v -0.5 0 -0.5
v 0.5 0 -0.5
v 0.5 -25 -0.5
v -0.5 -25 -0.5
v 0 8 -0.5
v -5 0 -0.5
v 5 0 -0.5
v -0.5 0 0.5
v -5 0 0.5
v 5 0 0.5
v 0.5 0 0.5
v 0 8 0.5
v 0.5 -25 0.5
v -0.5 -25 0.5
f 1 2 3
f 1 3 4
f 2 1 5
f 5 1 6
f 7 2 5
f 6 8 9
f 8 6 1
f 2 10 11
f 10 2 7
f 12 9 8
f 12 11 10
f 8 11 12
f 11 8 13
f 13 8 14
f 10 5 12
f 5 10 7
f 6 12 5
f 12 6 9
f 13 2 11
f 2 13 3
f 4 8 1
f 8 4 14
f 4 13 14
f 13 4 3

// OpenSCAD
module Arrow_01(){
    color("#008080"){
        // Arrow
        linear_extrude(height = 1, center= true){
            polygon([[-5,0],[5,0],[0,8]], paths=[[0,1,2]]);
        }   
        // Stick
        translate([0,-10,0]){
        
            cube([1,30,1], center = true);
        }    
    }
}

Arrow_01();
     
// Written by Nicolì Angelo (Gengio) 2024: 
// MIT License

//Permission is hereby granted, free of charge, to any person obtaining a copy of this software and associated documentation files (the "Software"), to deal in the Software without restriction, including without limitation the rights to use, copy, modify, merge, publish, distribute, sublicense, and/or sell copies of the Software, and to permit persons to whom the Software is furnished to do so, subject to the following conditions:

//The above copyright notice and this permission notice shall be included in all copies or substantial portions of the Software.

//THE SOFTWARE IS PROVIDED "AS IS", WITHOUT WARRANTY OF ANY KIND, EXPRESS OR IMPLIED, INCLUDING BUT NOT LIMITED TO THE WARRANTIES OF MERCHANTABILITY, FITNESS FOR A PARTICULAR PURPOSE AND NONINFRINGEMENT. IN NO EVENT SHALL THE AUTHORS OR COPYRIGHT HOLDERS BE LIABLE FOR ANY CLAIM, DAMAGES OR OTHER LIABILITY, WHETHER IN AN ACTION OF CONTRACT, TORT OR OTHERWISE, ARISING FROM, OUT OF OR IN CONNECTION WITH THE SOFTWARE OR THE USE OR OTHER DEALINGS IN THE SOFTWARE.
